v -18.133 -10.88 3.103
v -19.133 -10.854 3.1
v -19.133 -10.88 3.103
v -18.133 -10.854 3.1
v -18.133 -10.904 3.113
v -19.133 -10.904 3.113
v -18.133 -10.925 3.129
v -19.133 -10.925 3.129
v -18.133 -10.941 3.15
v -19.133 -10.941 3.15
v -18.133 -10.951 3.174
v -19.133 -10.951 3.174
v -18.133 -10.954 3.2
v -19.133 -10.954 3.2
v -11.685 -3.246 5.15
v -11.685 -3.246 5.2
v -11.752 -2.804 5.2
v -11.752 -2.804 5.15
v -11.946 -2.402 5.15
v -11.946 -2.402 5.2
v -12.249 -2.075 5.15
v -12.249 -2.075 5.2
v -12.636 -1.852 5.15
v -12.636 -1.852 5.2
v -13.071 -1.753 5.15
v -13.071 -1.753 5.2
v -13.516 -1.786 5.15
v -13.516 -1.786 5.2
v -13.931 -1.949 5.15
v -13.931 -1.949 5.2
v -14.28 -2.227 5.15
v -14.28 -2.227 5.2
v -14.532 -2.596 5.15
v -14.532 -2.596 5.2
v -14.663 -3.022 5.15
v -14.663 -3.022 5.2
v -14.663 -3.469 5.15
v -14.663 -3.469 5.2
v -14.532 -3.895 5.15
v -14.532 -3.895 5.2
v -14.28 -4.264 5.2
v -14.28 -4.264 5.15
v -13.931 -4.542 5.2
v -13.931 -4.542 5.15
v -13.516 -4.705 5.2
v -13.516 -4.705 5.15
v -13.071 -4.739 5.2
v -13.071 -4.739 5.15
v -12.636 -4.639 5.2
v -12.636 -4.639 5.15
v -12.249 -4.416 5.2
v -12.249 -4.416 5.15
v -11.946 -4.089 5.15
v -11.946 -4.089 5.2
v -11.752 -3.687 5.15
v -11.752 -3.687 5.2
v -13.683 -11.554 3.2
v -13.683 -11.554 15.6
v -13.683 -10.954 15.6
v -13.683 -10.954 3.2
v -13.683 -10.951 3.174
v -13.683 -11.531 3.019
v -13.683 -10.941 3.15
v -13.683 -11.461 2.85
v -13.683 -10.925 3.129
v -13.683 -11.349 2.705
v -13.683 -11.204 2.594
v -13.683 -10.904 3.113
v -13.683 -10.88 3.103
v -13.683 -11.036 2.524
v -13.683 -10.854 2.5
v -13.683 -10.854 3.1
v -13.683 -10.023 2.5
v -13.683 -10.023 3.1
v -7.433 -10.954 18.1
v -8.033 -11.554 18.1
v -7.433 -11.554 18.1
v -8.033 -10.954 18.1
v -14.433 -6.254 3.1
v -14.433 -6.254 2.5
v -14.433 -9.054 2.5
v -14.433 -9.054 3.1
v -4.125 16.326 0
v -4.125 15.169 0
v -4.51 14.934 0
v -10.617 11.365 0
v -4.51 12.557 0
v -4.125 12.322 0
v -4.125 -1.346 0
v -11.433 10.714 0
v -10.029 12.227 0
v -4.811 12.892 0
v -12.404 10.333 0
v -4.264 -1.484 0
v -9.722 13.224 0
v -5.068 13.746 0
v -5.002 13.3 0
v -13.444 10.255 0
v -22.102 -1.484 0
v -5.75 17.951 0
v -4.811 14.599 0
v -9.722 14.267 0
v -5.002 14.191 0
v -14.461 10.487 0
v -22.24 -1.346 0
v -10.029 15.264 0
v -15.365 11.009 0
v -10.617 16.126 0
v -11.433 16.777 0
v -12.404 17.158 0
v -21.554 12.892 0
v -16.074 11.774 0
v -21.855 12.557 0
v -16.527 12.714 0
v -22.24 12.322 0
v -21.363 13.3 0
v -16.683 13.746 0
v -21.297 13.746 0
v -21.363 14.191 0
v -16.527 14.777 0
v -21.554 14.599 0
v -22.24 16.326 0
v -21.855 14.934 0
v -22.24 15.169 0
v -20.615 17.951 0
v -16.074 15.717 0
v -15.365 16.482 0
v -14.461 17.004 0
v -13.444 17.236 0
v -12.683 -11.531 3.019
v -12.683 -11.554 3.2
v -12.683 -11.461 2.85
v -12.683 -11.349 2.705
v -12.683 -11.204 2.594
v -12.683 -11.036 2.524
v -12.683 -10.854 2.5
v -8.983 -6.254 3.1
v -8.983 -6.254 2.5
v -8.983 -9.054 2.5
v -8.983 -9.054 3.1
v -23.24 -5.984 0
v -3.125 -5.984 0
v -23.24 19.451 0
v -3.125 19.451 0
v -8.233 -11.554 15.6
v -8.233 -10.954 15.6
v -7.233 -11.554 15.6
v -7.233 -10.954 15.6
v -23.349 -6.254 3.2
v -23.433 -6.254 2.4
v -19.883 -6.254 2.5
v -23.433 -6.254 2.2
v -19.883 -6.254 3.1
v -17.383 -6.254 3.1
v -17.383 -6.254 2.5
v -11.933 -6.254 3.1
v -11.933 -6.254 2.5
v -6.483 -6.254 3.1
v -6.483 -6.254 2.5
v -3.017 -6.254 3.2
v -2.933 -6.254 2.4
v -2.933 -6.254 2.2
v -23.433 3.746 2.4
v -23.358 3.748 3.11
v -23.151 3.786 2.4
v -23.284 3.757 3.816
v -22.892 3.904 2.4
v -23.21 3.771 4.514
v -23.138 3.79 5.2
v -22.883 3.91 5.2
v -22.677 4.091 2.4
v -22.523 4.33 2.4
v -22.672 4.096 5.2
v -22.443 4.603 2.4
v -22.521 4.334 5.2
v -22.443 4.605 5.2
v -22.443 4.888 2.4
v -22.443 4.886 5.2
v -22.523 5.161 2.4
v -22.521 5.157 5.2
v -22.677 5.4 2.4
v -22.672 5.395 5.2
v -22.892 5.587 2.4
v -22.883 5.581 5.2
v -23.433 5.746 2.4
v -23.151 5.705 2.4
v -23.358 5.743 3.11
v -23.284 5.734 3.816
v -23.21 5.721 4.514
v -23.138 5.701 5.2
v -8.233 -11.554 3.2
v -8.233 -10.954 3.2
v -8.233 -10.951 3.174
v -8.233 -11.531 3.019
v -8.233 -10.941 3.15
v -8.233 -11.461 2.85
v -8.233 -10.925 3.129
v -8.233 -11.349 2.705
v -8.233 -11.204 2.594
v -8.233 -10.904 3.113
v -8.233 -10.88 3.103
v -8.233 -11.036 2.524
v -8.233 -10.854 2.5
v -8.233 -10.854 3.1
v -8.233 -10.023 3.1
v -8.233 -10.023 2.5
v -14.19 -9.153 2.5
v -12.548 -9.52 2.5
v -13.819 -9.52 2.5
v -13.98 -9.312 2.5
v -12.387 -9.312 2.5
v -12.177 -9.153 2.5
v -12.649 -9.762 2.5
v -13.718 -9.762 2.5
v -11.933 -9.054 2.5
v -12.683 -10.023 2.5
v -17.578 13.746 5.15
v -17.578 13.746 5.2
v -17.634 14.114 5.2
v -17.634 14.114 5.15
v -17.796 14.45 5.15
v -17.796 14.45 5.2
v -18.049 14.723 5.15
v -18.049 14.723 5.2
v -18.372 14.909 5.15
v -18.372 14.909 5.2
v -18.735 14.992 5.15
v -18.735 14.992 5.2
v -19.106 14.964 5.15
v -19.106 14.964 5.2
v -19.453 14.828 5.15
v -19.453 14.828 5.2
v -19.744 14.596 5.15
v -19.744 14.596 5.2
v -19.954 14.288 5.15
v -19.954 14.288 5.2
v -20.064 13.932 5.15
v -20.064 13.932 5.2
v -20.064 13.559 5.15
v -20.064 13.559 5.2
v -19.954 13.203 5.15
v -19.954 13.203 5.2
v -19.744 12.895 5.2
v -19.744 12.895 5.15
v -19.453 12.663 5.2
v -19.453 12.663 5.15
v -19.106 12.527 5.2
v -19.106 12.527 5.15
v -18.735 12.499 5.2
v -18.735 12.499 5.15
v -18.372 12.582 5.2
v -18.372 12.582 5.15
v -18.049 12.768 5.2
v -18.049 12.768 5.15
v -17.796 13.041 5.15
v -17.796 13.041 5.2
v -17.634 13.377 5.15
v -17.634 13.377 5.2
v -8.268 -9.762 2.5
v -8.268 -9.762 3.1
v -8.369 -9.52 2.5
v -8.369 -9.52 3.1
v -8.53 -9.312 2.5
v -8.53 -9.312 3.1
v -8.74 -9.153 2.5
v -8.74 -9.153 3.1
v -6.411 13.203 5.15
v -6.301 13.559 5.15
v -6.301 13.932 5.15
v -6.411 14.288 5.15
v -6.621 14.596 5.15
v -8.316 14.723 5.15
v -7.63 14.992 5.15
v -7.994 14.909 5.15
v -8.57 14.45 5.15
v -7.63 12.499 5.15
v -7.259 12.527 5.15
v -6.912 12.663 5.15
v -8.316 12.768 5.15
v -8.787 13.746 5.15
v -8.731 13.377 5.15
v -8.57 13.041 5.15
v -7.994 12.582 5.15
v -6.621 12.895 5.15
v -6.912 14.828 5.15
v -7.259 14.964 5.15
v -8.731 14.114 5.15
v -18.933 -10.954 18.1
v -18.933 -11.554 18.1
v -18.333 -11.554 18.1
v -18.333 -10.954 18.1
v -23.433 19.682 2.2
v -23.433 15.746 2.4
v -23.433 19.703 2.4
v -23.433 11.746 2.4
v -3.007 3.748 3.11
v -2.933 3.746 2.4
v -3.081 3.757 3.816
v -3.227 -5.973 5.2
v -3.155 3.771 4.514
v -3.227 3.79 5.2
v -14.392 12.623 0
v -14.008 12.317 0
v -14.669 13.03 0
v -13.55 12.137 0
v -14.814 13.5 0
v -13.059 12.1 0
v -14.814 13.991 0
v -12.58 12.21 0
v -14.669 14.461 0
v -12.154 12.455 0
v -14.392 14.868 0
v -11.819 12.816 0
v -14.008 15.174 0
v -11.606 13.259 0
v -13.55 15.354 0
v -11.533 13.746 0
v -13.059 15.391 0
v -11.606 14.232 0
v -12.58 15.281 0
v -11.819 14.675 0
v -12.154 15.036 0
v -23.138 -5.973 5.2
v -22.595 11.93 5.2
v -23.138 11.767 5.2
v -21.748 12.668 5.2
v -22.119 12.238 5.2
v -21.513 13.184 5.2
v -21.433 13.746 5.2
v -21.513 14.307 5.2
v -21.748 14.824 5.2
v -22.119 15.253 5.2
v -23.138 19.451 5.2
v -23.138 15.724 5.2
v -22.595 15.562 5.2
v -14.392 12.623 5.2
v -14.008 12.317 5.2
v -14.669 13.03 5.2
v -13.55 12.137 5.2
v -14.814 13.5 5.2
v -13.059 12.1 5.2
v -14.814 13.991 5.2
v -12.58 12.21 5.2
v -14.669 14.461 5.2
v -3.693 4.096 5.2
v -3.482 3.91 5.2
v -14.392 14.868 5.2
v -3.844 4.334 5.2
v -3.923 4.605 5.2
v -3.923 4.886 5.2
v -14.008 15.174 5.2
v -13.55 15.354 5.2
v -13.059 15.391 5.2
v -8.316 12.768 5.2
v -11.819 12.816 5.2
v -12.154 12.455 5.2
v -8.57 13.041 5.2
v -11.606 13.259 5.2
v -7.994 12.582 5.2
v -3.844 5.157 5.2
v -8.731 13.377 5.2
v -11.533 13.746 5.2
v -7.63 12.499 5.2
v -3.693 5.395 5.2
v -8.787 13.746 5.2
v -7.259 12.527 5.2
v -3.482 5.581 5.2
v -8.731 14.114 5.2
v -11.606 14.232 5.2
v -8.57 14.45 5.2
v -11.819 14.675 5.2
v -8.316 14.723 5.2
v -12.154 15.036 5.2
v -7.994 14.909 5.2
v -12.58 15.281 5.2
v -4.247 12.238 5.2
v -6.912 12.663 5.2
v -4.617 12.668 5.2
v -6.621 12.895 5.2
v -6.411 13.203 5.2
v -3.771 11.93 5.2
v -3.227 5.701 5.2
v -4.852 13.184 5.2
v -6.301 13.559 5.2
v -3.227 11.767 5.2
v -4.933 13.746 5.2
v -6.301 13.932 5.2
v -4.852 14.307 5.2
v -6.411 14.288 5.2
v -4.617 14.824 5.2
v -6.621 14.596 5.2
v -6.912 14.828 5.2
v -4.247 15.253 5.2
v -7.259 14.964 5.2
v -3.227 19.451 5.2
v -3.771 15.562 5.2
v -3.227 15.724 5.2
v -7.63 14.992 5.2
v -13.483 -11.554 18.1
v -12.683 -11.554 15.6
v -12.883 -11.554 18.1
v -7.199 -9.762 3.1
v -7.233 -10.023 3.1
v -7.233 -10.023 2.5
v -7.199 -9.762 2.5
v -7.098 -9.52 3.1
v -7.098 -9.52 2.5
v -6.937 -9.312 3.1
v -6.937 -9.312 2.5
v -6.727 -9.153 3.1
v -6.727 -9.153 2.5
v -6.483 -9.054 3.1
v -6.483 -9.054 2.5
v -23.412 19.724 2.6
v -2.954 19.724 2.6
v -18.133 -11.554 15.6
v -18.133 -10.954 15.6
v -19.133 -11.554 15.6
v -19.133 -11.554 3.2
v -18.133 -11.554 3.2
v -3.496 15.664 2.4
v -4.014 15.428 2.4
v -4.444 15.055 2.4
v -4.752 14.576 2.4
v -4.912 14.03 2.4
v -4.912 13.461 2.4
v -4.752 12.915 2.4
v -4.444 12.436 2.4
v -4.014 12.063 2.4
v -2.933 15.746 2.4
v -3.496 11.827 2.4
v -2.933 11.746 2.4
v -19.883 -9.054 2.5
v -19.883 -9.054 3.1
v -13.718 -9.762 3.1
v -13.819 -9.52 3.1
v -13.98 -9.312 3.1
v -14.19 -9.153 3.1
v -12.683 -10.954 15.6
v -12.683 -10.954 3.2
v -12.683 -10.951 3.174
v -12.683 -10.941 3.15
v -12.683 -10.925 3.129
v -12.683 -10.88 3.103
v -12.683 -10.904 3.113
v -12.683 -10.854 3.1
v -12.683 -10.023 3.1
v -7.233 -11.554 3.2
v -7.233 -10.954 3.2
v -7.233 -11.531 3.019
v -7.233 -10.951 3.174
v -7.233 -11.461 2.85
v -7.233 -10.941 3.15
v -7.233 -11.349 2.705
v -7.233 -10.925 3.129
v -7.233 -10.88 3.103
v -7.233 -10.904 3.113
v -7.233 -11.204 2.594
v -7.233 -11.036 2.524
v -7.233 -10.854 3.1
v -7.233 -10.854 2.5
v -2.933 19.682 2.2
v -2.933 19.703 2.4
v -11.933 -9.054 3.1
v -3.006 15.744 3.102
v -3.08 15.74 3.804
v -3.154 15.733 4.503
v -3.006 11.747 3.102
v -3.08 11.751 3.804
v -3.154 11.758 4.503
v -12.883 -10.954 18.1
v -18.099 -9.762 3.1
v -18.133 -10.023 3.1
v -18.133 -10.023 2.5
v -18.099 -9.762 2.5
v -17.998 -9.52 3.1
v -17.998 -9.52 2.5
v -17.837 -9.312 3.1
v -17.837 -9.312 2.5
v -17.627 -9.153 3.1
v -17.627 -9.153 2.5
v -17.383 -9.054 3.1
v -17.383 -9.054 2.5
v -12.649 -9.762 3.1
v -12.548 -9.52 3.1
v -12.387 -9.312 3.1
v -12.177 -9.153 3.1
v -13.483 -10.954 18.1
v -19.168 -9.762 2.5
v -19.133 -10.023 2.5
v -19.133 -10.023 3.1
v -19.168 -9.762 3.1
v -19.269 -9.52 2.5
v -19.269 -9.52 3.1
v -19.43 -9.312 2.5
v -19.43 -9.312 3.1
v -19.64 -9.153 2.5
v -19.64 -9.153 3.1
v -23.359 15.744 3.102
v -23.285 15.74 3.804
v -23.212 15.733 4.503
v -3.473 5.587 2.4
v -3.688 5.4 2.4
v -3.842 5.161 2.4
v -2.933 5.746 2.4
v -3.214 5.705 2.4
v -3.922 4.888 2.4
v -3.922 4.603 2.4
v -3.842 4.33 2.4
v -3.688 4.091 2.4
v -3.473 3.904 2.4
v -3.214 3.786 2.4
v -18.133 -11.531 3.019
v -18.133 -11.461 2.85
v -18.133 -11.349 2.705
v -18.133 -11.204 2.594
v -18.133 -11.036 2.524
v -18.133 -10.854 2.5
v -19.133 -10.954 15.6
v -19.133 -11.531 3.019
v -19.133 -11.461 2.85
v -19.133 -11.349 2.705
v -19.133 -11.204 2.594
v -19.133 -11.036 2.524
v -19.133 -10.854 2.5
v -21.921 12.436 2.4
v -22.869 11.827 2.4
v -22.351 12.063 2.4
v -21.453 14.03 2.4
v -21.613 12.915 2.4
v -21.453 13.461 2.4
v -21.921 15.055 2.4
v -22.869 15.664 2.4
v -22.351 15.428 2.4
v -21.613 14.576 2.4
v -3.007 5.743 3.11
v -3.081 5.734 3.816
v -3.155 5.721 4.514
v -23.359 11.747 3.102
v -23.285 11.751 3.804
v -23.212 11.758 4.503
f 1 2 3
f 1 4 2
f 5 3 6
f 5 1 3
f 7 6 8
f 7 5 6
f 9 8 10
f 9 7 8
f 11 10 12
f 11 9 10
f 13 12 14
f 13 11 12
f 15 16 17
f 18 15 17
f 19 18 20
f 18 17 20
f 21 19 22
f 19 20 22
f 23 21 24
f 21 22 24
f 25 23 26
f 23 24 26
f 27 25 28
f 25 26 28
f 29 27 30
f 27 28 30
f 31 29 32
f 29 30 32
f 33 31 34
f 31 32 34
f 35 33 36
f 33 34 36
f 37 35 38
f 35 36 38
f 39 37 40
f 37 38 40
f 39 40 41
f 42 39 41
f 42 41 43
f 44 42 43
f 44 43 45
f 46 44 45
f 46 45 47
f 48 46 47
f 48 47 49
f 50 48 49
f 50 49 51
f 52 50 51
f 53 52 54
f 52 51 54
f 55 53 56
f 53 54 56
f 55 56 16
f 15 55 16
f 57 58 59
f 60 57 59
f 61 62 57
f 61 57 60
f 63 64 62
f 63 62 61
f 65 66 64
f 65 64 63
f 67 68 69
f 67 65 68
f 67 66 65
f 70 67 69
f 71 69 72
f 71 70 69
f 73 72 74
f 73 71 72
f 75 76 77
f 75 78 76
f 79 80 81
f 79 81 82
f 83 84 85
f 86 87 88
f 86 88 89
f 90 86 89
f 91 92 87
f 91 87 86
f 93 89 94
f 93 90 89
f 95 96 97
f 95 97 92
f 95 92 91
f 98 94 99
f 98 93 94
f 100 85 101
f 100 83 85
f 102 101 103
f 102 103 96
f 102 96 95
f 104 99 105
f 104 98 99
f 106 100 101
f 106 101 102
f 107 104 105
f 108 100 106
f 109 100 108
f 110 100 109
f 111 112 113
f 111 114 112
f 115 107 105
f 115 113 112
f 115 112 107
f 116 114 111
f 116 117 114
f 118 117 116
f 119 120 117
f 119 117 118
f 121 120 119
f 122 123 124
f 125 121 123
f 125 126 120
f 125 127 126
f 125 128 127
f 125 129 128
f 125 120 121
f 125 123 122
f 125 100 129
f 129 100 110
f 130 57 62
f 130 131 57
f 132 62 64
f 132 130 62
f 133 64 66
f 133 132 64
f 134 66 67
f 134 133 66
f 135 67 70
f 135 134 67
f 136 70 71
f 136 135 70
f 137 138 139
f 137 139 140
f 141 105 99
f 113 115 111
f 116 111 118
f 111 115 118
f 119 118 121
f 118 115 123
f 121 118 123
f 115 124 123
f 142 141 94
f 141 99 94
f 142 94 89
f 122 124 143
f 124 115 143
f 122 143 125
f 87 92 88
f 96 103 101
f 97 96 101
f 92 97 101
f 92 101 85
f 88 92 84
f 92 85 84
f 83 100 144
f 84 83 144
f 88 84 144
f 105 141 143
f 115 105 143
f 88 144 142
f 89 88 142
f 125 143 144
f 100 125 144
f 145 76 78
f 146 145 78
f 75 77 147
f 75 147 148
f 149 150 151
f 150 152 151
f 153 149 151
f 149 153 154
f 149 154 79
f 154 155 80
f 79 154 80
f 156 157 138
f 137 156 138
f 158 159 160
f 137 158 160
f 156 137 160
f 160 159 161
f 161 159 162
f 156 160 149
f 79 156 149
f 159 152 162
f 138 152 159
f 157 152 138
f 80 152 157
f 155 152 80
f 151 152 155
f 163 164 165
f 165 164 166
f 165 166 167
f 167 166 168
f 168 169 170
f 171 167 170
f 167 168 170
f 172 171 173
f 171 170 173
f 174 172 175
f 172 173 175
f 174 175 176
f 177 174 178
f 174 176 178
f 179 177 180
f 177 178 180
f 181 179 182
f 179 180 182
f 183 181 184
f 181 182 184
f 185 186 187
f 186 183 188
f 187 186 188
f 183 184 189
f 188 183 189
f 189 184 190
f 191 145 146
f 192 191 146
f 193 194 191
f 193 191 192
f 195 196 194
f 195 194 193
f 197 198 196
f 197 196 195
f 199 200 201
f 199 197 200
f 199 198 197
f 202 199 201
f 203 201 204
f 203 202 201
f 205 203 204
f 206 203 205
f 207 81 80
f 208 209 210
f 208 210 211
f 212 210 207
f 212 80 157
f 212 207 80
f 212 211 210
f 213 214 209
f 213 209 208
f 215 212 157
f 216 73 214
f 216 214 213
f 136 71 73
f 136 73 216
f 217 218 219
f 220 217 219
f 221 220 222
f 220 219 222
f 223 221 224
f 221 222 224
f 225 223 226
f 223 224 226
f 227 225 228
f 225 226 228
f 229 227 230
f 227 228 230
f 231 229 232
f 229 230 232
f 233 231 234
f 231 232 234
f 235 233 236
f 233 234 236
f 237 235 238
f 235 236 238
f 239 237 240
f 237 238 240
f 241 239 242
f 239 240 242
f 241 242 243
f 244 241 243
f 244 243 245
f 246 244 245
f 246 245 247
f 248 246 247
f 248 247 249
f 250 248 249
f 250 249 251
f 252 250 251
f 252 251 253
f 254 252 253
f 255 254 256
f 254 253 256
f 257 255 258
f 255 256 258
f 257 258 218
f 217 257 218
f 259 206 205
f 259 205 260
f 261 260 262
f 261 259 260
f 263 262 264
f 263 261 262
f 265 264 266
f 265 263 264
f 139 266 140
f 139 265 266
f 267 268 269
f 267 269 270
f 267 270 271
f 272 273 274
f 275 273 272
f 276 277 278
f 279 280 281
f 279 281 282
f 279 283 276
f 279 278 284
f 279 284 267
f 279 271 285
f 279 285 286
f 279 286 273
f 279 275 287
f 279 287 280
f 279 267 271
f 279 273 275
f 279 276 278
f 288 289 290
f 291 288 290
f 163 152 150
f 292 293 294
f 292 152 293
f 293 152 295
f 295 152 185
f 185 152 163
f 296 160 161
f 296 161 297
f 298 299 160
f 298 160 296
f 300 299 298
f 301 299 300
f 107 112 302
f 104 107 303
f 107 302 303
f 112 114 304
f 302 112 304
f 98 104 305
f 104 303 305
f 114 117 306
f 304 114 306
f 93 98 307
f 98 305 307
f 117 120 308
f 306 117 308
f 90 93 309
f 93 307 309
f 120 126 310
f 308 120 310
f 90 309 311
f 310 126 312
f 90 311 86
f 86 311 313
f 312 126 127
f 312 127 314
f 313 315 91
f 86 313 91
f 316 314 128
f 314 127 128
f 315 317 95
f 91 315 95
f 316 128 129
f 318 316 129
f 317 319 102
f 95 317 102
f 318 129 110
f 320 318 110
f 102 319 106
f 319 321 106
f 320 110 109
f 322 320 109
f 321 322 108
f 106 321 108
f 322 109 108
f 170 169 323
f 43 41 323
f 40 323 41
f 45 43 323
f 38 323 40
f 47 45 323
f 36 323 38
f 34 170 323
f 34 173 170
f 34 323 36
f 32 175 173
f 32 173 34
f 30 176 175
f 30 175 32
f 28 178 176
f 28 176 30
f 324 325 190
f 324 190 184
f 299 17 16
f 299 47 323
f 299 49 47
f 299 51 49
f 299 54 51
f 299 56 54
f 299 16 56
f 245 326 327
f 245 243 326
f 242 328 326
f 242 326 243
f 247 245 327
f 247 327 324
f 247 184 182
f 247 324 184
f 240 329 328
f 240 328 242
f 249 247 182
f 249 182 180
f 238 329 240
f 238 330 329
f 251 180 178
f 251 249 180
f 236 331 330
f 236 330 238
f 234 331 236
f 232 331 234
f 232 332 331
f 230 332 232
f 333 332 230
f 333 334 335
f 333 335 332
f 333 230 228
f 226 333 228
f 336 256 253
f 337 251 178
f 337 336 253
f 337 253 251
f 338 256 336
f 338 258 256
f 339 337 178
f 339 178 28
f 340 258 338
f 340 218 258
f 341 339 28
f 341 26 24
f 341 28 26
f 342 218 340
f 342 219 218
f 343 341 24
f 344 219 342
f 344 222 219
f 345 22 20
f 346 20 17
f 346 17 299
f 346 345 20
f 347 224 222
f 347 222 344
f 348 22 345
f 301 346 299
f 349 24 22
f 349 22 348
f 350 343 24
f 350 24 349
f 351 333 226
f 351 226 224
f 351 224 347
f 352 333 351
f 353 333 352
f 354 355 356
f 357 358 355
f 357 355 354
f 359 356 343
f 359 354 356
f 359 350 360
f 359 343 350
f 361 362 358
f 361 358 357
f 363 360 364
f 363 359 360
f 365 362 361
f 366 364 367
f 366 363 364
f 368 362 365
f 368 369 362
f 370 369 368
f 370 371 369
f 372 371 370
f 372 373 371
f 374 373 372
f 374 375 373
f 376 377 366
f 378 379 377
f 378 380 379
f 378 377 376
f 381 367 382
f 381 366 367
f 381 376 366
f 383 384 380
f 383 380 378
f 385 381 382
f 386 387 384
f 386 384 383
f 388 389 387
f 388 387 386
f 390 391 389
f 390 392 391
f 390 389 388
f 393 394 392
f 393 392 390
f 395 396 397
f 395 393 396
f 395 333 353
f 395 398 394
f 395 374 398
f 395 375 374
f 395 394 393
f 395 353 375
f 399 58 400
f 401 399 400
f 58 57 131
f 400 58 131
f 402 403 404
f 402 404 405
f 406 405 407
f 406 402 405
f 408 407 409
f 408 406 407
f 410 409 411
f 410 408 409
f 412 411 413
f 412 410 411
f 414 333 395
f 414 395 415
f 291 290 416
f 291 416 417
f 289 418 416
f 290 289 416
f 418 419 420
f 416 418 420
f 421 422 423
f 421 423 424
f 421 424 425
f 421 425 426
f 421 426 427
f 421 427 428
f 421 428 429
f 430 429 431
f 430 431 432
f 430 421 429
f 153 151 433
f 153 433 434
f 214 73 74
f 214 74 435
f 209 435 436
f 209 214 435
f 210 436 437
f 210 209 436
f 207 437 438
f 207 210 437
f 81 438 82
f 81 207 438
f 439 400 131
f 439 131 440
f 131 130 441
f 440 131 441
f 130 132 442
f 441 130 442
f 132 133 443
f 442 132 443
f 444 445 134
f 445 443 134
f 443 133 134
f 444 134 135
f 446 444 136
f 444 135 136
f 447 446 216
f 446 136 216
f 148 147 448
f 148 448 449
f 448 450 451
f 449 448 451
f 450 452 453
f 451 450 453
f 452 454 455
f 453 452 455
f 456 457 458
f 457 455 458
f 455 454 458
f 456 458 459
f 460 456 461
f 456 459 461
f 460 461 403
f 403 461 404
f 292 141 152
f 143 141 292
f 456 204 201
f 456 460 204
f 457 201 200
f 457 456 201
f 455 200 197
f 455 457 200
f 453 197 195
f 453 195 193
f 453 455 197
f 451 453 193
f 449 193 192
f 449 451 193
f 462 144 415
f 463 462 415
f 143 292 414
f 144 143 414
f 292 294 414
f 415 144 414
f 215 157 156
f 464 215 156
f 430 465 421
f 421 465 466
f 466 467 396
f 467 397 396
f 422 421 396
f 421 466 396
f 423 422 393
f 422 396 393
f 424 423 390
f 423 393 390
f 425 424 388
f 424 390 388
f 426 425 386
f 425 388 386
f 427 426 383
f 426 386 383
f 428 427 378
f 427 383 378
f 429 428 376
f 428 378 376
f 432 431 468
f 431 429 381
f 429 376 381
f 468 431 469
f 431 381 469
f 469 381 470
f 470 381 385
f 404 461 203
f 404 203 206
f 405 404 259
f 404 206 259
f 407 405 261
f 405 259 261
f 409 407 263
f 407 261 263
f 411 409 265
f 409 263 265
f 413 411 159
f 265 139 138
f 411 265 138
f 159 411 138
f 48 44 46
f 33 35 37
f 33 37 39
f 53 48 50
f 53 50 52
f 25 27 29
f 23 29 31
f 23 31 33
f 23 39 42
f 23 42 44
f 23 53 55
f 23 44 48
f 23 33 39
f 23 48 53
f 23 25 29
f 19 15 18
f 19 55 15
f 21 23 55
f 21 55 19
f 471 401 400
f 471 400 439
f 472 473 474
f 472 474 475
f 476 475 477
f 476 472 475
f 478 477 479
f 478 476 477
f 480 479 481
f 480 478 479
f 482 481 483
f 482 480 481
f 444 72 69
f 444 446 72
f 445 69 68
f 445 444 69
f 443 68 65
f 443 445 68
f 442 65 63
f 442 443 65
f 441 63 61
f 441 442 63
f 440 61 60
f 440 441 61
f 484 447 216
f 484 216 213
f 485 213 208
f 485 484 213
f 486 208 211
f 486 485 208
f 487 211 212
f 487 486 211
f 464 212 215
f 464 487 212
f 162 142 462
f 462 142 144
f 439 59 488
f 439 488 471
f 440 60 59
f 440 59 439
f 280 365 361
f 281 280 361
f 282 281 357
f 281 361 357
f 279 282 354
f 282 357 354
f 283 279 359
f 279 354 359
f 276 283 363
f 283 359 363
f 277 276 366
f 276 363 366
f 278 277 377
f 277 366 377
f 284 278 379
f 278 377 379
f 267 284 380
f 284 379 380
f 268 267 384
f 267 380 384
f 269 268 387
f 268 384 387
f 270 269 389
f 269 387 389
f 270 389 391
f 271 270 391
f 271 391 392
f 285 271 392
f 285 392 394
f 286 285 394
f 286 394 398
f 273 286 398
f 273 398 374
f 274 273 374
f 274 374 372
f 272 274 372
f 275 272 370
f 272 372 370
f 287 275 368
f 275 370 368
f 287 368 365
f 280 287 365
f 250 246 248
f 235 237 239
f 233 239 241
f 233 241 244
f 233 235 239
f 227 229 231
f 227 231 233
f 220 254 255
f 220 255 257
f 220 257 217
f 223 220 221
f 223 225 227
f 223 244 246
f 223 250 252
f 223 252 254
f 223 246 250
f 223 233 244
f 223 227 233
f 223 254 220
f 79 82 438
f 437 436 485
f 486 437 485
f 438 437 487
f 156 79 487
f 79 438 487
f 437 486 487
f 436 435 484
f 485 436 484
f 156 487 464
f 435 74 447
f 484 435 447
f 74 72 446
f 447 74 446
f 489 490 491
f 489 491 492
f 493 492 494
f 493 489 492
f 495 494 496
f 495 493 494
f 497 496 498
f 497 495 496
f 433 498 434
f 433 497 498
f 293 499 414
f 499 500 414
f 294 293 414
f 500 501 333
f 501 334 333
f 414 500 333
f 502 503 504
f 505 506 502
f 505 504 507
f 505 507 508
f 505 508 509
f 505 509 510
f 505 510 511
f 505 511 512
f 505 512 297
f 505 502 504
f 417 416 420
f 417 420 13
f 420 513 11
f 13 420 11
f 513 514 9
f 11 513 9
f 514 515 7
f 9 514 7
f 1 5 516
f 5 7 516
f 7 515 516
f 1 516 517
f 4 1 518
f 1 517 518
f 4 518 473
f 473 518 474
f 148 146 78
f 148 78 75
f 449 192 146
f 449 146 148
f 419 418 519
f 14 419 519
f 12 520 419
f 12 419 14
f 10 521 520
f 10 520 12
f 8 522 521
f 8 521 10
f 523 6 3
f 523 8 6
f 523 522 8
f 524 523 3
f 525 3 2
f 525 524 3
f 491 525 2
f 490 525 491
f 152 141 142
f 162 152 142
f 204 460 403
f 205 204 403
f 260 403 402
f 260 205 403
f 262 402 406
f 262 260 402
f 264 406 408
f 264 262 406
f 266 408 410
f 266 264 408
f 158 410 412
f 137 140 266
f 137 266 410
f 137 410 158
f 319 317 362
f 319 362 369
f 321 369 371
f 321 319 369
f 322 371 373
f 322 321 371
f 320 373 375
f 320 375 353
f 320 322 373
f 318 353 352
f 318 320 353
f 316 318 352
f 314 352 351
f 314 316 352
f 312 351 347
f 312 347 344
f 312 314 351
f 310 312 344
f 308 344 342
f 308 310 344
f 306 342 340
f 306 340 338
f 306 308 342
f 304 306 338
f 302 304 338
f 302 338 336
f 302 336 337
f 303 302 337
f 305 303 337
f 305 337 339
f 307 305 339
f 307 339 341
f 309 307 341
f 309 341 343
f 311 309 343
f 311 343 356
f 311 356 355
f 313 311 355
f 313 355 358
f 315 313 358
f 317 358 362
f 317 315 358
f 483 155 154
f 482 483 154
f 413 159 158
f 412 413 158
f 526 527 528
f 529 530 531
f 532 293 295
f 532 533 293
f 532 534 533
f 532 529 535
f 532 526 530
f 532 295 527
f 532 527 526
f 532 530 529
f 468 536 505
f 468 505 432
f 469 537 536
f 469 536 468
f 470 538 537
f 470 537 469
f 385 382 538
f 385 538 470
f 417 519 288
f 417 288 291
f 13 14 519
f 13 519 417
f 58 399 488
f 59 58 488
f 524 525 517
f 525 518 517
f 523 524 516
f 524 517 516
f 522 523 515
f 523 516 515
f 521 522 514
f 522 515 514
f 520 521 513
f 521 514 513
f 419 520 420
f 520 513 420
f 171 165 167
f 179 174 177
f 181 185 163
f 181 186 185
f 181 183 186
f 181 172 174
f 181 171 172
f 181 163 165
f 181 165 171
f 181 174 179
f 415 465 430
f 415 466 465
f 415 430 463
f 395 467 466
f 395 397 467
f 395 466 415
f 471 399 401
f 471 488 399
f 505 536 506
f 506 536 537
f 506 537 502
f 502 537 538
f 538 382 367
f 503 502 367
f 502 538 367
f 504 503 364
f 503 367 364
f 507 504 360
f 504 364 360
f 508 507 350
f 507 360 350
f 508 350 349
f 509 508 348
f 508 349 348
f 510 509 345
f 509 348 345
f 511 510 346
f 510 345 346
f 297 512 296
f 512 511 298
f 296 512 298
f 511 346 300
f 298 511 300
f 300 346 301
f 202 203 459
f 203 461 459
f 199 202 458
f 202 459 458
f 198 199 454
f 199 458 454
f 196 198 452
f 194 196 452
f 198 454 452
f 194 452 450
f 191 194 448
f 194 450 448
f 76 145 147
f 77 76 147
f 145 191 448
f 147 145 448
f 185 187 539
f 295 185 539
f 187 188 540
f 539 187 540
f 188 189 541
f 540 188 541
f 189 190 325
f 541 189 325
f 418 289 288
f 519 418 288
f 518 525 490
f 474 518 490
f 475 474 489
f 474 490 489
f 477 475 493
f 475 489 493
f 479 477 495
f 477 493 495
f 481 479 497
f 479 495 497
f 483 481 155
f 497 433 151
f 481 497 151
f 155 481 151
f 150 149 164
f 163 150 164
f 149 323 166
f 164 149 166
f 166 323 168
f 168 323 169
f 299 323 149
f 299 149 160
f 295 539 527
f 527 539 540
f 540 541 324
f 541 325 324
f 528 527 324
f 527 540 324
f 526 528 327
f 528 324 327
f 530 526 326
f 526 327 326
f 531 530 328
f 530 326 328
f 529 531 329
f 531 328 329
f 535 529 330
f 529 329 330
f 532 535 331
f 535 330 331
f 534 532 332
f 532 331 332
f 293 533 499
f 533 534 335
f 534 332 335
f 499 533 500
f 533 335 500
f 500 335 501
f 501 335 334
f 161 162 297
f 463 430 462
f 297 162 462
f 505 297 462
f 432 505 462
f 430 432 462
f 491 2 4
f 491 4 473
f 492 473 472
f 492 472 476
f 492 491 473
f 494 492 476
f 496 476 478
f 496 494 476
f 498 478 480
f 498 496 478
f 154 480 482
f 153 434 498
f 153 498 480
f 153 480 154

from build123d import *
from OCP.BRepFilletAPI import BRepFilletAPI_MakeChamfer

# Parameters (mm, degrees)
SZKIC1_W                                = 20.5
SZKIC1_H                                = 26
SZKIC1_R                                = 1.65
DODANIE_WYCI_GNI_CIE1_DEPTH             = 5.2
SZKIC2_R                                = 2
SZKIC2_R_2                              = 1
WYTNIJ_WYCI_GNI_CIE1_DEPTH              = 2.8
SZKIC4_W                                = 2.5
SZKIC4_H                                = 0.6
DODANIE_WYCI_GNI_CIE2_DEPTH             = 2.8
SZKIC7_W                                = 1
SZKIC7_H                                = 0.6
DODANIE_WYCI_GNI_CIE3_DEPTH             = 2.5
ZAOKR_GLENIE2_R                         = 1
SFAZOWANIE3_SIZE                        = 2.2
SFAZOWANIE3_SIZE2                       = 0.19247506
SFAZOWANIE4_SIZE                        = 2.8
SFAZOWANIE4_SIZE2                       = 0.294291859
SFAZOWANIE5_SIZE                        = 0.294291859
SFAZOWANIE5_SIZE_2                      = 2.8
SFAZOWANIE6_SIZE                        = 2.2
SFAZOWANIE6_SIZE2                       = 0.270126034
SFAZOWANIE7_SIZE                        = 2
SFAZOWANIE7_SIZE2                       = 0.281081669
SKETCH_1_W                              = 1
SKETCH_1_H                              = 0.6
EXTRUDE_1_DEPTH                         = 15
FILLET_1_R                              = 0.1
FILLET_2_R                              = 0.7
CHAMFER_1_SIZE                          = 2.5
CHAMFER_1_SIZE2                         = 0.2
PATTERN_LINEAR_9_COUNT                  = 2
PATTERN_LINEAR_9_PITCH                  = 5.45
ZAOKR_GLENIE2_OF_PATTERN_LINEAR_9_R     = 1
FILLET_1_OF_PATTERN_LINEAR_9_R          = 0.1
FILLET_2_OF_PATTERN_LINEAR_9_R          = 0.7
CHAMFER_1_OF_PATTERN_LINEAR_9_SIZE      = 2.5
CHAMFER_1_OF_PATTERN_LINEAR_9_SIZE2     = 0.2
PATTERN_LINEAR_9_COL_COUNT              = 2
PATTERN_LINEAR_9_COL_PITCH              = 5.45
ZAOKR_GLENIE2_OF_PATTERN_LINEAR_9_COL_R = 1
FILLET_1_OF_PATTERN_LINEAR_9_COL_R      = 0.1
FILLET_2_OF_PATTERN_LINEAR_9_COL_R      = 0.7
CHAMFER_1_OF_PATTERN_LINEAR_9_COL_SIZE  = 2.5
CHAMFER_1_OF_PATTERN_LINEAR_9_COL_SIZE2 = 0.2
SKETCH_4_R                              = 3.5
EXTRUDE_3_DEPTH                         = 0.0001
SKETCH_5_R                              = 1.249888398
SKETCH_5_R_2                            = 1.497284422
CUT_EXTRUDE_1_DEPTH                     = 0.05


with BuildPart() as part:
    # Szkic1 → Dodanie-wyciągnięcie1 (new body)
    with BuildSketch(Plane.XY):
        with Locations((-13.182644045, 6.74550931)):
            Rectangle(SZKIC1_W, SZKIC1_H)
        with Locations((-13.182644045, 13.74550931)):
            Circle(SZKIC1_R, mode=Mode.SUBTRACT)
    extrude(amount=DODANIE_WYCI_GNI_CIE1_DEPTH)

    # Szkic2 → Wytnij-wyciągnięcie1 (cut)
    with BuildSketch(Plane.XY.offset(5.2)):
        with Locations((-23.432644045, 13.74550931)):
            Circle(SZKIC2_R)
        with Locations((-2.932644045, 13.74550931)):
            Circle(SZKIC2_R)
        with Locations((-23.432644045, 4.74550931)):
            Circle(SZKIC2_R_2)
        with Locations((-2.932644045, 4.74550931)):
            Circle(SZKIC2_R_2)
    extrude(amount=-WYTNIJ_WYCI_GNI_CIE1_DEPTH, mode=Mode.SUBTRACT)

    # Szkic4 → Dodanie-wyciągnięcie2 (add)
    with BuildSketch(Plane.XZ.offset(6.25449069)):
        with Locations((-13.183317029, 2.8)):
            Rectangle(SZKIC4_W, SZKIC4_H)
    dodanie_wyci_gni_cie2 = extrude(amount=DODANIE_WYCI_GNI_CIE2_DEPTH)

    # Szkic7 → Dodanie-wyciągnięcie3 (add)
    with BuildSketch(Plane.XZ.offset(9.05449069)):
        with Locations((-13.183317029, 2.8)):
            Rectangle(SZKIC7_W, SZKIC7_H)
    dodanie_wyci_gni_cie3 = extrude(amount=DODANIE_WYCI_GNI_CIE3_DEPTH)

    # Zaokrąglenie2
    # the kernel refuses this fillet: 1 mm, written as the material it adds along each edge
    with BuildSketch(Plane(origin=(-13.683317029, -9.05449069, 2.5), x_dir=(-1, 0, 0), z_dir=(0, 0, 1)), Plane(origin=(-12.683317029, -9.05449069, 3.1), x_dir=(1, 0, 0), z_dir=(0, 0, -1))) as zaokr_glenie2_piece_1:
        with BuildLine():
            CenterArc((1, 0.968245837), ZAOKR_GLENIE2_R, 180, 75.522487814)
            Line((0, 0.968245837), (-0.02, 0.968245837))
            Line((-0.02, 0.968245837), (-0.02, 0))
            Line((-0.02, 0), (0, -0.02))
            ThreePointArc((0, -0.02), (0.375, -0.02), (0.745, -0.019364917))
            Line((0.745, -0.019364917), (0.75, 0))
        make_face()
    extrude(amount=0.6)

    # Sfazowanie3: one chamfer whose edges measure the first distance from different faces: ONE call of the kernel's chamfer builder (chamfer() names one face for all edges)
    sfazowanie3_edges_1 = [part.edges().sort_by_distance(p)[0] for p in [
        (-2.932644045, 6.74550931, 0),
    ]]
    sfazowanie3_side_1 = [part.faces().sort_by_distance(p)[0] for p in [
        (-2.932644045, 6.177941742, 2.42972973),
    ]]
    sfazowanie3_edges_2 = [part.edges().sort_by_distance(p)[0] for p in [
        (-23.432644045, 6.74550931, 0),
    ]]
    sfazowanie3_side_2 = [part.faces().sort_by_distance(p)[0] for p in [
        (-23.432644045, 6.177941742, 2.42972973),
    ]]
    sfazowanie3 = BRepFilletAPI_MakeChamfer(part.part.solid().wrapped)
    for e in sfazowanie3_edges_1:
        sfazowanie3.Add(SFAZOWANIE3_SIZE, SFAZOWANIE3_SIZE2, e.wrapped, sfazowanie3_side_1[0].wrapped)  # the first distance lies on this face
    for e in sfazowanie3_edges_2:
        sfazowanie3.Add(SFAZOWANIE3_SIZE, SFAZOWANIE3_SIZE2, e.wrapped, sfazowanie3_side_2[0].wrapped)  # the first distance lies on this face
    add(Compound.cast(sfazowanie3.Shape()), mode=Mode.REPLACE)

    # Sfazowanie4: one chamfer whose edges measure the first distance from different faces: ONE call of the kernel's chamfer builder (chamfer() names one face for all edges)
    sfazowanie4_edges_1 = [part.edges().sort_by_distance(p)[0] for p in [
        (-2.932644045, -1.25449069, 5.2),
        (-2.932644045, 8.74550931, 5.2),
        (-2.932644045, 17.74550931, 5.2),
    ]]
    sfazowanie4_side_1 = [part.faces().sort_by_distance(p)[0] for p in [
        (-2.932644045, -5.992765643, 3.7),
    ]]
    sfazowanie4_edges_2 = [part.edges().sort_by_distance(p)[0] for p in [
        (-23.432644045, 17.74550931, 5.2),
        (-23.432644045, -1.25449069, 5.2),
        (-23.432644045, 8.74550931, 5.2),
    ]]
    sfazowanie4_side_2 = [part.faces().sort_by_distance(p)[0] for p in [
        (-23.432644045, 19.483784263, 3.7),
    ]]
    sfazowanie4 = BRepFilletAPI_MakeChamfer(part.part.solid().wrapped)
    for e in sfazowanie4_edges_1:
        sfazowanie4.Add(SFAZOWANIE4_SIZE, SFAZOWANIE4_SIZE2, e.wrapped, sfazowanie4_side_1[0].wrapped)  # the first distance lies on this face
    for e in sfazowanie4_edges_2:
        sfazowanie4.Add(SFAZOWANIE4_SIZE, SFAZOWANIE4_SIZE2, e.wrapped, sfazowanie4_side_2[0].wrapped)  # the first distance lies on this face
    add(Compound.cast(sfazowanie4.Shape()), mode=Mode.REPLACE)

    # Sfazowanie5
    # the kernel refuses this chamfer: 2.8, 0.294291859 mm, written as the material it takes off along each edge
    with BuildSketch(Plane(origin=(-30.518693961, 19.74550931, 0), x_dir=(0, -0.9396808679591201, -0.3420524322258136), z_dir=(1, 0, 0))) as sfazowanie5_piece_1:
        Polygon((SFAZOWANIE5_SIZE * 0.939680867141, -SFAZOWANIE5_SIZE * 0.342052431928), (-SFAZOWANIE5_SIZE_2 * 0.342052432226, -SFAZOWANIE5_SIZE_2 * 0.939680867959), (0, 0), align=None)
    extrude(amount=34.672099833, mode=Mode.SUBTRACT)
    with BuildSketch(Plane(origin=(-30.416877162, 19.74550931, 5.2), x_dir=(0, -0.9396808679591199, 0.34205243222581383), z_dir=(1, 0, 0))) as sfazowanie5_piece_2:
        Polygon((SFAZOWANIE5_SIZE * 0.939680867141, SFAZOWANIE5_SIZE * 0.342052431928), (-SFAZOWANIE5_SIZE_2 * 0.342052432226, SFAZOWANIE5_SIZE_2 * 0.939680867959), (0, 0), align=None)
    extrude(amount=34.468466235, mode=Mode.SUBTRACT)

    # Sfazowanie6
    sfazowanie6_edges = [part.edges().sort_by_distance(p)[0] for p in [
        (-13.182644045, -6.25449069, 0),
    ]]
    sfazowanie6_side = [part.faces().sort_by_distance(p)[0] for p in [
        (-3.144136362, -6.25449069, 2.3),
    ]]
    chamfer(sfazowanie6_edges, length=SFAZOWANIE6_SIZE, length2=SFAZOWANIE6_SIZE2, reference=sfazowanie6_side[0])

    # Sfazowanie7
    sfazowanie7_edges = [part.edges().sort_by_distance(p)[0] for p in [
        (-13.182644045, -6.25449069, 5.2),
    ]]
    sfazowanie7_side = [part.faces().sort_by_distance(p)[0] for p in [
        (-13.182626986, -6.25449069, 3.714922556),
    ]]
    chamfer(sfazowanie7_edges, length=SFAZOWANIE7_SIZE, length2=SFAZOWANIE7_SIZE2, reference=sfazowanie7_side[0])

    # 草图1 → 凸台-拉伸1 (add)
    with BuildSketch(Plane.XY.offset(3.1)):
        with Locations((-13.183317029, -11.25449069)):
            Rectangle(SKETCH_1_W, SKETCH_1_H)
    extrude_1 = extrude(amount=EXTRUDE_1_DEPTH)

    # 圆角1
    fillet_1_edges = [part.edges().sort_by_distance(p)[0] for p in [
        (-13.183317029, -10.95449069, 3.1),
    ]]
    fillet(fillet_1_edges, radius=FILLET_1_R)

    # 圆角2
    fillet_2_edges = [part.edges().sort_by_distance(p)[0] for p in [
        (-13.183317029, -11.55449069, 2.5),
    ]]
    fillet(fillet_2_edges, radius=FILLET_2_R)

    # 倒角1: one chamfer whose edges measure the first distance from different faces: ONE call of the kernel's chamfer builder (chamfer() names one face for all edges)
    chamfer_1_edges_1 = [part.edges().sort_by_distance(p)[0] for p in [
        (-13.683317029, -11.25449069, 18.1),
    ]]
    chamfer_1_side_1 = [part.faces().sort_by_distance(p)[0] for p in [
        (-13.683317029, -11.209262494, 9.953166713),
    ]]
    chamfer_1_edges_2 = [part.edges().sort_by_distance(p)[0] for p in [
        (-12.683317029, -11.25449069, 18.1),
    ]]
    chamfer_1_side_2 = [part.faces().sort_by_distance(p)[0] for p in [
        (-12.683317029, -11.209262494, 9.953166713),
    ]]
    chamfer_1 = BRepFilletAPI_MakeChamfer(part.part.solid().wrapped)
    for e in chamfer_1_edges_1:
        chamfer_1.Add(CHAMFER_1_SIZE, CHAMFER_1_SIZE2, e.wrapped, chamfer_1_side_1[0].wrapped)  # the first distance lies on this face
    for e in chamfer_1_edges_2:
        chamfer_1.Add(CHAMFER_1_SIZE, CHAMFER_1_SIZE2, e.wrapped, chamfer_1_side_2[0].wrapped)  # the first distance lies on this face
    add(Compound.cast(chamfer_1.Shape()), mode=Mode.REPLACE)

    # 阵列(线性)9: Dodanie-wyciągnięcie2, Dodanie-wyciągnięcie3, 凸台-拉伸1 ×2
    with Locations(*[(i * PATTERN_LINEAR_9_PITCH, 0, 0) for i in range(1, PATTERN_LINEAR_9_COUNT)]):
        add(dodanie_wyci_gni_cie2)
        add(dodanie_wyci_gni_cie3)
        add(extrude_1)

    # Zaokrąglenie2 of 阵列(线性)9
    # the kernel refuses this fillet: 1 mm, written as the material it adds along each edge
    with BuildSketch(Plane(origin=(-8.233317029, -9.05449069, 2.5), x_dir=(-1, 0, 0), z_dir=(0, 0, 1))) as zaokr_glenie2_of_pattern_linear_9_piece_1:
        with BuildLine():
            CenterArc((1, 0.968245837), ZAOKR_GLENIE2_OF_PATTERN_LINEAR_9_R, 180, 75.522487814)
            Line((0, 0.968245837), (-0.02, 0.968245837))
            Line((-0.02, 0.968245837), (-0.02, 0))
            Line((-0.02, 0), (0, -0.02))
            ThreePointArc((0, -0.02), (0.375, -0.02), (0.745, -0.019364917))
            Line((0.745, -0.019364917), (0.75, 0))
        make_face()
    extrude(amount=0.6)
    with BuildSketch(Plane(origin=(-7.233317029, -9.05449069, 3.1), x_dir=(0, -1, 0), z_dir=(0, 0, -1))) as zaokr_glenie2_of_pattern_linear_9_piece_2:
        with BuildLine():
            CenterArc((0.968245837, -1), ZAOKR_GLENIE2_OF_PATTERN_LINEAR_9_R, 90, 75.522487814)
            Line((0, -0.75), (-0.019364917, -0.745))
            ThreePointArc((-0.019364917, -0.745), (-0.02, -0.375), (-0.02, 0))
            Line((-0.02, 0), (0, 0.02))
            Line((0, 0.02), (0.968245837, 0.02))
            Line((0.968245837, 0.02), (0.968245837, 0))
        make_face()
    extrude(amount=0.6)

    # 圆角1 of 阵列(线性)9
    fillet_1_of_pattern_linear_9_edges = [part.edges().sort_by_distance(p)[0] for p in [
        (-7.733317029, -10.95449069, 3.1),
    ]]
    fillet(fillet_1_of_pattern_linear_9_edges, radius=FILLET_1_OF_PATTERN_LINEAR_9_R)

    # 圆角2 of 阵列(线性)9
    fillet_2_of_pattern_linear_9_edges = [part.edges().sort_by_distance(p)[0] for p in [
        (-7.733317029, -11.55449069, 2.5),
    ]]
    fillet(fillet_2_of_pattern_linear_9_edges, radius=FILLET_2_OF_PATTERN_LINEAR_9_R)

    # 倒角1 of 阵列(线性)9: one chamfer whose edges measure the first distance from different faces: ONE call of the kernel's chamfer builder (chamfer() names one face for all edges)
    chamfer_1_of_pattern_linear_9_edges_1 = [part.edges().sort_by_distance(p)[0] for p in [
        (-8.233317029, -11.25449069, 18.1),
    ]]
    chamfer_1_of_pattern_linear_9_side_1 = [part.faces().sort_by_distance(p)[0] for p in [
        (-8.233317029, -11.209262494, 9.953166713),
    ]]
    chamfer_1_of_pattern_linear_9_edges_2 = [part.edges().sort_by_distance(p)[0] for p in [
        (-7.233317029, -11.25449069, 18.1),
    ]]
    chamfer_1_of_pattern_linear_9_side_2 = [part.faces().sort_by_distance(p)[0] for p in [
        (-7.233317029, -11.209262494, 9.953166713),
    ]]
    chamfer_1_of_pattern_linear_9 = BRepFilletAPI_MakeChamfer(part.part.solid().wrapped)
    for e in chamfer_1_of_pattern_linear_9_edges_1:
        chamfer_1_of_pattern_linear_9.Add(CHAMFER_1_OF_PATTERN_LINEAR_9_SIZE, CHAMFER_1_OF_PATTERN_LINEAR_9_SIZE2, e.wrapped, chamfer_1_of_pattern_linear_9_side_1[0].wrapped)  # the first distance lies on this face
    for e in chamfer_1_of_pattern_linear_9_edges_2:
        chamfer_1_of_pattern_linear_9.Add(CHAMFER_1_OF_PATTERN_LINEAR_9_SIZE, CHAMFER_1_OF_PATTERN_LINEAR_9_SIZE2, e.wrapped, chamfer_1_of_pattern_linear_9_side_2[0].wrapped)  # the first distance lies on this face
    add(Compound.cast(chamfer_1_of_pattern_linear_9.Shape()), mode=Mode.REPLACE)

    # 阵列(线性)9 col: Dodanie-wyciągnięcie2, Dodanie-wyciągnięcie3, 凸台-拉伸1 ×2
    with Locations(*[(-i * PATTERN_LINEAR_9_COL_PITCH, 0, 0) for i in range(1, PATTERN_LINEAR_9_COL_COUNT)]):
        add(dodanie_wyci_gni_cie2)
        add(dodanie_wyci_gni_cie3)
        add(extrude_1)

    # Zaokrąglenie2 of 阵列(线性)9 col
    # the kernel refuses this fillet: 1 mm, written as the material it adds along each edge
    with BuildSketch(Plane(origin=(-19.133317029, -9.05449069, 2.5), x_dir=(-1, 0, 0), z_dir=(0, 0, 1))) as zaokr_glenie2_of_pattern_linear_9_col_piece_1:
        with BuildLine():
            CenterArc((1, 0.968245837), ZAOKR_GLENIE2_OF_PATTERN_LINEAR_9_COL_R, 180, 75.522487814)
            Line((0, 0.968245837), (-0.02, 0.968245837))
            Line((-0.02, 0.968245837), (-0.02, 0))
            Line((-0.02, 0), (0, -0.02))
            ThreePointArc((0, -0.02), (0.375, -0.02), (0.745, -0.019364917))
            Line((0.745, -0.019364917), (0.75, 0))
        make_face()
    extrude(amount=0.6)
    with BuildSketch(Plane(origin=(-18.133317029, -9.05449069, 3.1), x_dir=(0, -1, 0), z_dir=(0, 0, -1))) as zaokr_glenie2_of_pattern_linear_9_col_piece_2:
        with BuildLine():
            CenterArc((0.968245837, -1), ZAOKR_GLENIE2_OF_PATTERN_LINEAR_9_COL_R, 90, 75.522487814)
            Line((0, -0.75), (-0.019364917, -0.745))
            ThreePointArc((-0.019364917, -0.745), (-0.02, -0.375), (-0.02, 0))
            Line((-0.02, 0), (0, 0.02))
            Line((0, 0.02), (0.968245837, 0.02))
            Line((0.968245837, 0.02), (0.968245837, 0))
        make_face()
    extrude(amount=0.6)

    # 圆角1 of 阵列(线性)9 col
    fillet_1_of_pattern_linear_9_col_edges = [part.edges().sort_by_distance(p)[0] for p in [
        (-18.633317029, -10.95449069, 3.1),
    ]]
    fillet(fillet_1_of_pattern_linear_9_col_edges, radius=FILLET_1_OF_PATTERN_LINEAR_9_COL_R)

    # 圆角2 of 阵列(线性)9 col
    fillet_2_of_pattern_linear_9_col_edges = [part.edges().sort_by_distance(p)[0] for p in [
        (-18.633317029, -11.55449069, 2.5),
    ]]
    fillet(fillet_2_of_pattern_linear_9_col_edges, radius=FILLET_2_OF_PATTERN_LINEAR_9_COL_R)

    # 倒角1 of 阵列(线性)9 col: one chamfer whose edges measure the first distance from different faces: ONE call of the kernel's chamfer builder (chamfer() names one face for all edges)
    chamfer_1_of_pattern_linear_9_col_edges_1 = [part.edges().sort_by_distance(p)[0] for p in [
        (-19.133317029, -11.25449069, 18.1),
    ]]
    chamfer_1_of_pattern_linear_9_col_side_1 = [part.faces().sort_by_distance(p)[0] for p in [
        (-19.133317029, -11.209262494, 9.953166713),
    ]]
    chamfer_1_of_pattern_linear_9_col_edges_2 = [part.edges().sort_by_distance(p)[0] for p in [
        (-18.133317029, -11.25449069, 18.1),
    ]]
    chamfer_1_of_pattern_linear_9_col_side_2 = [part.faces().sort_by_distance(p)[0] for p in [
        (-18.133317029, -11.209262494, 9.953166713),
    ]]
    chamfer_1_of_pattern_linear_9_col = BRepFilletAPI_MakeChamfer(part.part.solid().wrapped)
    for e in chamfer_1_of_pattern_linear_9_col_edges_1:
        chamfer_1_of_pattern_linear_9_col.Add(CHAMFER_1_OF_PATTERN_LINEAR_9_COL_SIZE, CHAMFER_1_OF_PATTERN_LINEAR_9_COL_SIZE2, e.wrapped, chamfer_1_of_pattern_linear_9_col_side_1[0].wrapped)  # the first distance lies on this face
    for e in chamfer_1_of_pattern_linear_9_col_edges_2:
        chamfer_1_of_pattern_linear_9_col.Add(CHAMFER_1_OF_PATTERN_LINEAR_9_COL_SIZE, CHAMFER_1_OF_PATTERN_LINEAR_9_COL_SIZE2, e.wrapped, chamfer_1_of_pattern_linear_9_col_side_2[0].wrapped)  # the first distance lies on this face
    add(Compound.cast(chamfer_1_of_pattern_linear_9_col.Shape()), mode=Mode.REPLACE)

    # 草图4 → 凸台-拉伸3 (add)
    with BuildSketch(Plane(origin=(0, 0, 0), x_dir=(-1, 0, 0), z_dir=(0, 0, -1))):
        with BuildLine():
            Line((5.750210339, 17.951217451), (4.125119105, 16.326126217))
            Line((4.125119105, 16.326126217), (4.125119105, 15.168616255))
            ThreePointArc((4.125119105, 15.168616255), (5.067970026, 13.74550931), (4.125119105, 12.322402365))
            Line((4.125119105, 12.322402365), (4.125119105, -1.345944481))
            Line((4.125119105, -1.345944481), (4.26353928, -1.484364656))
            Line((4.26353928, -1.484364656), (22.10174881, -1.484364656))
            Line((22.10174881, -1.484364656), (22.240168985, -1.345944481))
            Line((22.240168985, -1.345944481), (22.240168985, 12.322402365))
            ThreePointArc((22.240168985, 12.322402365), (21.297318064, 13.74550931), (22.240168985, 15.168616255))
            Line((22.240168985, 15.168616255), (22.240168985, 16.326126217))
            Line((22.240168985, 16.326126217), (20.615077751, 17.951217451))
            Line((20.615077751, 17.951217451), (5.750210339, 17.951217451))
        make_face()
        with Locations((13.182644045, 13.74550931)):
            Circle(SKETCH_4_R, mode=Mode.SUBTRACT)
    extrude(amount=EXTRUDE_3_DEPTH)

    # 草图5 → 切除-拉伸1 (cut)
    with BuildSketch(Plane.XY.offset(5.2)):
        with Locations(Location((-7.537050492, 13.74550931, 0), (0, 0, 180))):
            Circle(SKETCH_5_R)
        with Locations((-18.828237598, 13.74550931)):
            Circle(SKETCH_5_R)
        with Locations((-13.182644045, -3.245598745)):
            Circle(SKETCH_5_R_2)
    extrude(amount=-CUT_EXTRUDE_1_DEPTH, mode=Mode.SUBTRACT)


solid = part.part
